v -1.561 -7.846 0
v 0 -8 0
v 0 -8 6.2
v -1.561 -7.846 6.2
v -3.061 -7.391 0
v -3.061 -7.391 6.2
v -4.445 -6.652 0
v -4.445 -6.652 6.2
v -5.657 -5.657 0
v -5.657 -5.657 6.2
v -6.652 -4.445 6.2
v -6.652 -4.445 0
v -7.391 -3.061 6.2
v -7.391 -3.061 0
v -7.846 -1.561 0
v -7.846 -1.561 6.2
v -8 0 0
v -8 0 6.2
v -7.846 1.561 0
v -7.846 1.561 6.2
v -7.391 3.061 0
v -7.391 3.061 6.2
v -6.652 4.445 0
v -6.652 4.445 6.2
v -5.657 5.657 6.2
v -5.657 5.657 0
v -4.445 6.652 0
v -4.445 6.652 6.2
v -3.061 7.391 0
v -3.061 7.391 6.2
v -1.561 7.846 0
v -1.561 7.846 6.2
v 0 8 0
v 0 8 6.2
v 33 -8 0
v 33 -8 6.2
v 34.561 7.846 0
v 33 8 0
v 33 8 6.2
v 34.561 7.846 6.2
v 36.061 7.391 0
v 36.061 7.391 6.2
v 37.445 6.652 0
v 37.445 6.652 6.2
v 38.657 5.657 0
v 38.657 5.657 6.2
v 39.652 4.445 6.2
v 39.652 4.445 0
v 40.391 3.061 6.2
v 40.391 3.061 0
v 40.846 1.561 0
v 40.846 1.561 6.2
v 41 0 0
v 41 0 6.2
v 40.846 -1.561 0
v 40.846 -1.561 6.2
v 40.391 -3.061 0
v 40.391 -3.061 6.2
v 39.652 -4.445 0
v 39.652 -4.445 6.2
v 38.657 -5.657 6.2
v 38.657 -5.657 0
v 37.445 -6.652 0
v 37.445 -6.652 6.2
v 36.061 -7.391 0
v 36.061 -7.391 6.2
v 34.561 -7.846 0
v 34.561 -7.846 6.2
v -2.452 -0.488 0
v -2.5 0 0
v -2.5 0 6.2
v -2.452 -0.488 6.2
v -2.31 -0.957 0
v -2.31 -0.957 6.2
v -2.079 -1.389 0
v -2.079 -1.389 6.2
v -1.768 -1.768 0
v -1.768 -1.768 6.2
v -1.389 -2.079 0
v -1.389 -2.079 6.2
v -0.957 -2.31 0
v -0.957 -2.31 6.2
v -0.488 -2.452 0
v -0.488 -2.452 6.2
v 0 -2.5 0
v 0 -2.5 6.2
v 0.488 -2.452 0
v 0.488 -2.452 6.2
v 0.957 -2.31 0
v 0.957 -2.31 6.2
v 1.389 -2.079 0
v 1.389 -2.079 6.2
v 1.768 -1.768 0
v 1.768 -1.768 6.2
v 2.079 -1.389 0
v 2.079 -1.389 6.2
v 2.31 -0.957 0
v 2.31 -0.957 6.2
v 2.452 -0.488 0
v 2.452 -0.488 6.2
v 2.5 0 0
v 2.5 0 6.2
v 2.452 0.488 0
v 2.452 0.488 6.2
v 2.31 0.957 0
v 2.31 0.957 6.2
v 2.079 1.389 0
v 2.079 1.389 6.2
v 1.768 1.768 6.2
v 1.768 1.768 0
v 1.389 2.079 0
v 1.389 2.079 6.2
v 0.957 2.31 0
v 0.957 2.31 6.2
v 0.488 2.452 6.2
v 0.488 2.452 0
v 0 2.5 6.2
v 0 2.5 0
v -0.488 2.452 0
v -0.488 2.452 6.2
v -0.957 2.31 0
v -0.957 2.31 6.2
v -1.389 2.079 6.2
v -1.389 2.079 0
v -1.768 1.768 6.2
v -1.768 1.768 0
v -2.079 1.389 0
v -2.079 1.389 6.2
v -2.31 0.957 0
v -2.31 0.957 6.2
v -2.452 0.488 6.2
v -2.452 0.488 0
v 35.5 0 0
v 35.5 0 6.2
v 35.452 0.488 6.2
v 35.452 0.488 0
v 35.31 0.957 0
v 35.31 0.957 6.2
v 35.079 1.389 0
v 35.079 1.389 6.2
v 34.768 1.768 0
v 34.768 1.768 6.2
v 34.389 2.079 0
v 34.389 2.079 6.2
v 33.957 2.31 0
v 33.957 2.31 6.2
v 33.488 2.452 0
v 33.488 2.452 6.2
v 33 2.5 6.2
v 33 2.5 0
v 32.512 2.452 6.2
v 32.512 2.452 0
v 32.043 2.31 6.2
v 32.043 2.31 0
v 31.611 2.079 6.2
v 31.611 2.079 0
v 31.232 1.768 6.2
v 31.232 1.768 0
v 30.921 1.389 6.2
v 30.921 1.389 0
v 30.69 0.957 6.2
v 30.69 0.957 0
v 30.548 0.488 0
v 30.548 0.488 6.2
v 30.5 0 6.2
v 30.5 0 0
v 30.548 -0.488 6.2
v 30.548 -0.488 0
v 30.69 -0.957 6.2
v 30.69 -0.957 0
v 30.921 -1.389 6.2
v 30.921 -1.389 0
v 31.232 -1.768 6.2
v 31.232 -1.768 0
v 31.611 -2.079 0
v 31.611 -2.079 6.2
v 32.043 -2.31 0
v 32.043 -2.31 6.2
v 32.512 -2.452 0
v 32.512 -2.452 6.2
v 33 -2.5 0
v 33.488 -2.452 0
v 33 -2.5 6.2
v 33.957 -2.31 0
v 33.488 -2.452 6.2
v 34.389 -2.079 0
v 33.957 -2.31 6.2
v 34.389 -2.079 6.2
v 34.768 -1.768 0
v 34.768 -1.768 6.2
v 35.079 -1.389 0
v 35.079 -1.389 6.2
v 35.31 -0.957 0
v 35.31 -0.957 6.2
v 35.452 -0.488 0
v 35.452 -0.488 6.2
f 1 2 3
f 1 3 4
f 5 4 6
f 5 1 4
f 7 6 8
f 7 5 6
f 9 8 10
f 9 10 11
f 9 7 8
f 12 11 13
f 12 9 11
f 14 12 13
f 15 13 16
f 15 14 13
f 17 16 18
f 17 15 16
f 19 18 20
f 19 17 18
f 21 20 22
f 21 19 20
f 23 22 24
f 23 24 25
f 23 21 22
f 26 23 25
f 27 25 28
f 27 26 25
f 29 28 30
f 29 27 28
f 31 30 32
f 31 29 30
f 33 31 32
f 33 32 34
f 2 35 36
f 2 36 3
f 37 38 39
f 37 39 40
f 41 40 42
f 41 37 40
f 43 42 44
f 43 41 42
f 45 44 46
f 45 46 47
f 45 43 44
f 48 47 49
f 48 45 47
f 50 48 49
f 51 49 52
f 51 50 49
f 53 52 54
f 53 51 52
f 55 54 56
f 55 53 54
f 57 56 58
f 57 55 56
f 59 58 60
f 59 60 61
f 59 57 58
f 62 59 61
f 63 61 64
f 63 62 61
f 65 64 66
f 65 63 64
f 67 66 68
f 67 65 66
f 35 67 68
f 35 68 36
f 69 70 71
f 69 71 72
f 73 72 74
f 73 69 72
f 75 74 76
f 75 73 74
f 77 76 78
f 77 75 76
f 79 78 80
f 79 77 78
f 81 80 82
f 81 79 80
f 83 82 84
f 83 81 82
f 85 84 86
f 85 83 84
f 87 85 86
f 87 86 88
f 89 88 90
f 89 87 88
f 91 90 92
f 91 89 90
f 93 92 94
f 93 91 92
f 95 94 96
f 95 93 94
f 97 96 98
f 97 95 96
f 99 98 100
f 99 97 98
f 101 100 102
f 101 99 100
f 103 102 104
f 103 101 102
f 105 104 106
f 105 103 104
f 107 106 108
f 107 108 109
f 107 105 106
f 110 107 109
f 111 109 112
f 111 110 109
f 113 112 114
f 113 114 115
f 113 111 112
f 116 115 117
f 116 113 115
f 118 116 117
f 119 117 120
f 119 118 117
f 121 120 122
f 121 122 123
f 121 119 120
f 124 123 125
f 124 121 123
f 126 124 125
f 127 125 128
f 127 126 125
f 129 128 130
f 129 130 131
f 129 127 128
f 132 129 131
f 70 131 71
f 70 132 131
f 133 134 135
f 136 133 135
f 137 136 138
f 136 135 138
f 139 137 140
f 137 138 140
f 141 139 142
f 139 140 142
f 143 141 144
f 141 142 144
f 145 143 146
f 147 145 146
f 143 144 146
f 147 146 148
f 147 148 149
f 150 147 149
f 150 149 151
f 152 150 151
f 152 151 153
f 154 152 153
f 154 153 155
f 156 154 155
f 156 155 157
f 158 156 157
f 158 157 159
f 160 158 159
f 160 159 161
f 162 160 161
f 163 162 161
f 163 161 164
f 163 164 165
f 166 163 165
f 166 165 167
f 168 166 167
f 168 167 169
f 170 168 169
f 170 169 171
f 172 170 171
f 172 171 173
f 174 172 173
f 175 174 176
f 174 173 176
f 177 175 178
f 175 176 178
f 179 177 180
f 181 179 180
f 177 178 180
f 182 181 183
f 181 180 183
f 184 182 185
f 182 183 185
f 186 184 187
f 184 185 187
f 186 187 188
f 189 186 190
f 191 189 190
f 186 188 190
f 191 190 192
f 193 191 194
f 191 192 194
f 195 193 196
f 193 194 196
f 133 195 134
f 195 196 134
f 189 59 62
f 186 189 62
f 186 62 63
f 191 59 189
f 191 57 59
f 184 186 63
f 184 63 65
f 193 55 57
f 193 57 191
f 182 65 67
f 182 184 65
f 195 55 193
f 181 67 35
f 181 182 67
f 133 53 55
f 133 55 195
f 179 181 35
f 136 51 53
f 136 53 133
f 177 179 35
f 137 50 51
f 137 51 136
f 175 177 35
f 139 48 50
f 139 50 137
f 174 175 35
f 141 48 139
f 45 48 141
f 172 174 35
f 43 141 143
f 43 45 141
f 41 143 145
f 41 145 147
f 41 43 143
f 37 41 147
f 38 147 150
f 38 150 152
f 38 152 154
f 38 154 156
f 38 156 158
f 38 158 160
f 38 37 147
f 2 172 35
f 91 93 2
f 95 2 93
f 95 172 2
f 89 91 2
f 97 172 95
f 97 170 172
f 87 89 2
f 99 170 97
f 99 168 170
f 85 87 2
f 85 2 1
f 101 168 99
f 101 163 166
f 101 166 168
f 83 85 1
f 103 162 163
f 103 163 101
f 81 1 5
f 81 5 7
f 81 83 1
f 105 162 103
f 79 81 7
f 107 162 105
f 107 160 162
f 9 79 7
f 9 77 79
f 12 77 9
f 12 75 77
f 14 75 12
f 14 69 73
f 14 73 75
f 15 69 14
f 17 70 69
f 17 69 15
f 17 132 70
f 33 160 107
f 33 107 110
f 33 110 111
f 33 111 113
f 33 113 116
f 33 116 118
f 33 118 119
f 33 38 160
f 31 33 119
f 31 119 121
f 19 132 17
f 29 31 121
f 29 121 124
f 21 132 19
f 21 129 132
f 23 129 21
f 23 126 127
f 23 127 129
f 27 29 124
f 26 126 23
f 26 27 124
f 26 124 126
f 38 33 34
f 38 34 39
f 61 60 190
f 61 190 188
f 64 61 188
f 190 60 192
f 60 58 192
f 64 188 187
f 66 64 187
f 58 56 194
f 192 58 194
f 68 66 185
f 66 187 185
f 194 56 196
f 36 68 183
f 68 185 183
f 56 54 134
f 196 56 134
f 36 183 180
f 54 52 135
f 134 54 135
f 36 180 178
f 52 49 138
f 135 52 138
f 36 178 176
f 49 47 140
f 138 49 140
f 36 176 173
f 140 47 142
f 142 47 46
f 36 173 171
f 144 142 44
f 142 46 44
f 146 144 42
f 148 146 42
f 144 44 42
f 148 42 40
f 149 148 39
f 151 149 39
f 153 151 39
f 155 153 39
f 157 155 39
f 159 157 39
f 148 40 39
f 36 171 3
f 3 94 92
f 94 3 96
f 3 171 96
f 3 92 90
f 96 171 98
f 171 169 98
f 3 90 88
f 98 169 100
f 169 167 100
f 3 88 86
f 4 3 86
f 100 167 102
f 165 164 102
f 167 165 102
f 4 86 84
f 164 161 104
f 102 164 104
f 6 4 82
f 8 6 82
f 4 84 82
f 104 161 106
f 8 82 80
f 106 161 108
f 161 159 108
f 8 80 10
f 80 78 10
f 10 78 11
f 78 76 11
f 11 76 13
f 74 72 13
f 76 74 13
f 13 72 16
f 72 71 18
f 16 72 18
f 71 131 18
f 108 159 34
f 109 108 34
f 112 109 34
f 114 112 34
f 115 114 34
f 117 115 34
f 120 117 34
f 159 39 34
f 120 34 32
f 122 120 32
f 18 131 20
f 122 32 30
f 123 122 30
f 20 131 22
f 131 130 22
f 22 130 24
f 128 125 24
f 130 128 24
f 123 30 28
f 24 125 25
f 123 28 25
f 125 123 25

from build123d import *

# Parameters (mm, degrees)
SKETCH1_R           = 2.5
BOSS_EXTRUDE1_DEPTH = 6.2
SKETCH2_R           = 2.5
CUT_EXTRUDE1_DEPTH  = 16.2


with BuildPart() as part:
    # Sketch1 → Boss-Extrude1 (new body)
    with BuildSketch(Plane.XY):
        with BuildLine():
            Line((0, 8), (33, 8))
            ThreePointArc((33, 8), (41, 0), (33, -8))
            Line((33, -8), (0, -8))
            ThreePointArc((0, -8), (-8, 0), (0, 8))
        make_face()
        with Locations(Location((0, 0, 0), (0, 0, 180))):
            Circle(SKETCH1_R, mode=Mode.SUBTRACT)
    extrude(amount=BOSS_EXTRUDE1_DEPTH)

    # Sketch2 → Cut-Extrude1 (cut)
    with BuildSketch(Plane.XY.offset(6.2)):
        with Locations((33, 0)):
            Circle(SKETCH2_R)
    extrude(amount=-CUT_EXTRUDE1_DEPTH, mode=Mode.SUBTRACT)


solid = part.part
